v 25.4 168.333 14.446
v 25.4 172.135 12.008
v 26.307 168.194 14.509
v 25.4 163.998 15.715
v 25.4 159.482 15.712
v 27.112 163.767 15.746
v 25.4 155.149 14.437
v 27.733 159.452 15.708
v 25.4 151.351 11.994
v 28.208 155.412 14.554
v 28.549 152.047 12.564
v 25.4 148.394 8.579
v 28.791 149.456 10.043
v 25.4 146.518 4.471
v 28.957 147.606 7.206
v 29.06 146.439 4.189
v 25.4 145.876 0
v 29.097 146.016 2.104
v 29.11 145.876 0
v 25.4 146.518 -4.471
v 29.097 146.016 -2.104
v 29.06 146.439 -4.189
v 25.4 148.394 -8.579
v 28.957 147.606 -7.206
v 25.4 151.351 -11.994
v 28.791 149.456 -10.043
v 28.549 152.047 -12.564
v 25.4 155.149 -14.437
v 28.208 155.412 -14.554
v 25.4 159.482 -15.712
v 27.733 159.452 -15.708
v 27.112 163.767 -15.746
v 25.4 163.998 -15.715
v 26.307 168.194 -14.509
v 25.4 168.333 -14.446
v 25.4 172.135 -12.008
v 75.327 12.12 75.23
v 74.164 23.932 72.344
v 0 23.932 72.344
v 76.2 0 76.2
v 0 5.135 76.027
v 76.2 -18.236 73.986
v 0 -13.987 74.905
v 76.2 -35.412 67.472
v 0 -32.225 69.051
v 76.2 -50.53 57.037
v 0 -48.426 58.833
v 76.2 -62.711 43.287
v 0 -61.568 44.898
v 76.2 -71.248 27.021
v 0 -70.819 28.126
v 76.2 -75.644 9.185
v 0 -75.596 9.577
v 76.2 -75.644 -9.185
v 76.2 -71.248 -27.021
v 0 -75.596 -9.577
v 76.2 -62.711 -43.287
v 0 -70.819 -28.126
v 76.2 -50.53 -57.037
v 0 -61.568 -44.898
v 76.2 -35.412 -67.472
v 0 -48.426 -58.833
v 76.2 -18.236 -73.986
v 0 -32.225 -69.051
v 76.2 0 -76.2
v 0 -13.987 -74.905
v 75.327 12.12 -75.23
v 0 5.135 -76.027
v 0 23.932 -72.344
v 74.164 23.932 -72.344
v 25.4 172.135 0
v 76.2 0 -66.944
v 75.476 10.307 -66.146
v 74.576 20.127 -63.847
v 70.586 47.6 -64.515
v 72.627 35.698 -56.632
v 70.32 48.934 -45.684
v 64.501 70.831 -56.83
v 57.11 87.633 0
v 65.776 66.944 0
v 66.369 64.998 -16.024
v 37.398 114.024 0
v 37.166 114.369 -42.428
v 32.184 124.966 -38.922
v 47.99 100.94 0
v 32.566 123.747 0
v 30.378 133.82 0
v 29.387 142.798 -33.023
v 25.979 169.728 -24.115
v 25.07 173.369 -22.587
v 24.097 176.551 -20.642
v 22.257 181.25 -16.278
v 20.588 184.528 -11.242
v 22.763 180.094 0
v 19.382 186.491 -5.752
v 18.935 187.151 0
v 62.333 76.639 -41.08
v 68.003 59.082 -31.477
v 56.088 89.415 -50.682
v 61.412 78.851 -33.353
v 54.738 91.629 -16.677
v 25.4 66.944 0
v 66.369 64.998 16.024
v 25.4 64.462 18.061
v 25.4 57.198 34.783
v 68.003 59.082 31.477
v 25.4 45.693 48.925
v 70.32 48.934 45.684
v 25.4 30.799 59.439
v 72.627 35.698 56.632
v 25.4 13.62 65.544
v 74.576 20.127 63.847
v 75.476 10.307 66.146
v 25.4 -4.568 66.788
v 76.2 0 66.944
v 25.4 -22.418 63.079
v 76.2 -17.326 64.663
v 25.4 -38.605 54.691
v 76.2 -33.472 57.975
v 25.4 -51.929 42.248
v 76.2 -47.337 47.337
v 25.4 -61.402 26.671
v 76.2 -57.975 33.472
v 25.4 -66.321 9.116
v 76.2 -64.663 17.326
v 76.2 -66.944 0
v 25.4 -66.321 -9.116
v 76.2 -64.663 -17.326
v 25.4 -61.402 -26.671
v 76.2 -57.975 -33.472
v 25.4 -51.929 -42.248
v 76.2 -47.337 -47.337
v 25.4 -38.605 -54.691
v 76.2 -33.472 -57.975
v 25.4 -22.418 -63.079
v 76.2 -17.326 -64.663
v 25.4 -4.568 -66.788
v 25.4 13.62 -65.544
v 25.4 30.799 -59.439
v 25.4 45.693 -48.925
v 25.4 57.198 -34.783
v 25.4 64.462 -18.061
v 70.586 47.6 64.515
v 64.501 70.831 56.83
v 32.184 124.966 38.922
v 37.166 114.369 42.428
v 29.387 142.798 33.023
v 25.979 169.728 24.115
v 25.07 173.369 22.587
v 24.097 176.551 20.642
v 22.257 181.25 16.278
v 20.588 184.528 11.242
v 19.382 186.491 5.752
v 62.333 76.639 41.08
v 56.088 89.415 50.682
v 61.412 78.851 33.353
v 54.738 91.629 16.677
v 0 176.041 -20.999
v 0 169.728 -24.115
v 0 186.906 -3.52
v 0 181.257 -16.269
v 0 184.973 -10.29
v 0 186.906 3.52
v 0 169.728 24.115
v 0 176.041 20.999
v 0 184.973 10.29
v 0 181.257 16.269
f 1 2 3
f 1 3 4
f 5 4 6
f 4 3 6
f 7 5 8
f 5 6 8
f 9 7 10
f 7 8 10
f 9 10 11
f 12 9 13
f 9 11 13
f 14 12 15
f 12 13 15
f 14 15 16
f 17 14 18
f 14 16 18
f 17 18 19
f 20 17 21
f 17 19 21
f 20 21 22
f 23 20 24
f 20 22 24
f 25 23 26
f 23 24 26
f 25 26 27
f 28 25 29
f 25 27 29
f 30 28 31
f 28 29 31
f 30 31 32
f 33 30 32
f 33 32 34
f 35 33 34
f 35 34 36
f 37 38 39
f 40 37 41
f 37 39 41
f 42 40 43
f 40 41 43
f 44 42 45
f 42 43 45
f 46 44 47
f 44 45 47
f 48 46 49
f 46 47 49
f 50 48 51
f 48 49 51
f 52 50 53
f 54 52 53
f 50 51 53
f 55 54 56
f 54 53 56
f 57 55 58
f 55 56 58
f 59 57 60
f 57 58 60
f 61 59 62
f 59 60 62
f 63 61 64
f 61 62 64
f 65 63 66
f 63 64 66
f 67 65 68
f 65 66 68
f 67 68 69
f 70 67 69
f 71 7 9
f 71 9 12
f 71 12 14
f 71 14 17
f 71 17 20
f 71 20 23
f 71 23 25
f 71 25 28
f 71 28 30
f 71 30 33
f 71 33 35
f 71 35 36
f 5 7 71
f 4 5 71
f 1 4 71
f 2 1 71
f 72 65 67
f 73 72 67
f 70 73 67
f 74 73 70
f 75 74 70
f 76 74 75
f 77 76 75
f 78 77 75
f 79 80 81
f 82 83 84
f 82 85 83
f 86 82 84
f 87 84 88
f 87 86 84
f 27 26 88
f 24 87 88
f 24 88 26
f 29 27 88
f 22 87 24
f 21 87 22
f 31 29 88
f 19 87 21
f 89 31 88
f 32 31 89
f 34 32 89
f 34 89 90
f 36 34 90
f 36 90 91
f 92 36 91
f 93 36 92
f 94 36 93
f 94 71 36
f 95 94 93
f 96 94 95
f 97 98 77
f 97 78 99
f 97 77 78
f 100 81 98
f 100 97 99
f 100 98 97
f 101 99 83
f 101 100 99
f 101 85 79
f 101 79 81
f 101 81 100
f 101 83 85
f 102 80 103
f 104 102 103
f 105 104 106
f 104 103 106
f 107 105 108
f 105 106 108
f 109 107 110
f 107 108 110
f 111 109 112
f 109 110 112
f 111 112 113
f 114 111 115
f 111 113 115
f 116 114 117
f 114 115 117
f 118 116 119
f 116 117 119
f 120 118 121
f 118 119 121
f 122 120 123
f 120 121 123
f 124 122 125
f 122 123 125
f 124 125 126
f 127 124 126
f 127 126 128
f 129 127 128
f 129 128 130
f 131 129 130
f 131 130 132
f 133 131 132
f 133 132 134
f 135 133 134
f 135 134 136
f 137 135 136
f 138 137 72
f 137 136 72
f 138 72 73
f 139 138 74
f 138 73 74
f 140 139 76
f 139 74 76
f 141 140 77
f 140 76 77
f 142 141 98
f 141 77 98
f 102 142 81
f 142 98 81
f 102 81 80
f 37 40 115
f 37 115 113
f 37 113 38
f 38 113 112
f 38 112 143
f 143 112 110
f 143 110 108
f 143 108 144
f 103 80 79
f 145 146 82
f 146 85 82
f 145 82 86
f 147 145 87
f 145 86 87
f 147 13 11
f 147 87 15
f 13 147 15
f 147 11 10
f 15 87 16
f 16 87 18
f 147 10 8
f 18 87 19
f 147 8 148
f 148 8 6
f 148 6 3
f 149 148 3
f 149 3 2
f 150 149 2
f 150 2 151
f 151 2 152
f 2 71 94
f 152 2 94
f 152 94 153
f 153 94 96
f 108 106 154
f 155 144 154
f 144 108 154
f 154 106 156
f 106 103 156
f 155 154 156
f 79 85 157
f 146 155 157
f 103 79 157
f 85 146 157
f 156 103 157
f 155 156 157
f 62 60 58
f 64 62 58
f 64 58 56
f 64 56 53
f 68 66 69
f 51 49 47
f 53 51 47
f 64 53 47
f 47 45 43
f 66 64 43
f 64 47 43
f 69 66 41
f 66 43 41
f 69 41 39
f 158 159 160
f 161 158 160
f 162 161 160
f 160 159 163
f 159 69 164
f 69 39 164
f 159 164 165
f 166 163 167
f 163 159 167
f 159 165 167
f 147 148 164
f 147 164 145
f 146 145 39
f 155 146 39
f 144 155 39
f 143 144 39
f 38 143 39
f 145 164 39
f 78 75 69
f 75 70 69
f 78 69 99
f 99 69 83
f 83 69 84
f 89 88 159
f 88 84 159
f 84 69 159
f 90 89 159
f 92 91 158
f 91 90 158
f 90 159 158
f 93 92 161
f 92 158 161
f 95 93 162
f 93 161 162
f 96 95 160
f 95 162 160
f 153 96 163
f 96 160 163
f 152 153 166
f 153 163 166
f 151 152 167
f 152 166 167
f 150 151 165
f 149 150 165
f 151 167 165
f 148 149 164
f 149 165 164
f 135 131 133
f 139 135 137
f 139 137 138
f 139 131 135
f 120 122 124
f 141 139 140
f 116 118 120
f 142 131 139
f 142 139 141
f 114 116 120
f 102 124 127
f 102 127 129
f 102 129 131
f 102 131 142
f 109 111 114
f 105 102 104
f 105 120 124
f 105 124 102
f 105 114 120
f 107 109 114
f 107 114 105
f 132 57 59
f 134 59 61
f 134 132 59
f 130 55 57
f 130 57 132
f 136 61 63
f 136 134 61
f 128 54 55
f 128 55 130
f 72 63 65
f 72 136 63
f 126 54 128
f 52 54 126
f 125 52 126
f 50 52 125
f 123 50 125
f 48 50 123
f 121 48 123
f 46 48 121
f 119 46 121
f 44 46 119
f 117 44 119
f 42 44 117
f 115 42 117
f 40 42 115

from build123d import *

# Parameters (mm, degrees)
F1_DEPTH = 76.2
F2_R     = 66.9441745007
F2_R_2   = 15.875
F3_DEPTH = 50.8
F5_DEPTH = 137.16


# Not quite as in the source:
# - a feature names something its author has since deleted; it is built from what else it names


with BuildPart() as f1:
    # F0 (on Right) → F1 (new body)
    with BuildSketch(Plane.YZ):
        with BuildLine():
            Line((169.7282094477, 24.1148148653), (23.9315970236, 72.344444596))
            ThreePointArc((23.9315970236, 72.344444596), (-76.2, 0), (23.9315970236, -72.344444596))
            Line((23.9315970236, -72.344444596), (169.7282094477, -24.1148148653))
            ThreePointArc((169.7282094477, -24.1148148653), (187.1510104398, 0), (169.7282094477, 24.1148148653))
        make_face()
    extrude(amount=F1_DEPTH)

    # F2 (on face) → F3 (cut)
    with BuildSketch(Plane.YZ.offset(76.2)):
        Circle(F2_R)
        with Locations((161.7510104398, 0)):
            Circle(F2_R_2)
    extrude(amount=-F3_DEPTH, mode=Mode.SUBTRACT)

    # F4 (on Top) → F5 (cut, symmetric)
    with BuildSketch(Plane.XY):
        with BuildLine():
            add(Edge.make_bspline(
                [(76.2, 0), (69.7670128122, 106.6320095463), (15.5509841332, 89.3209706266), (33.872663393, 196.783595894), (-4.8366077244, 199.8663842678)],
                knots=[0, 0, 0, 0, 0.5611625531, 1, 1, 1, 1], degree=3))
            Line((76.2, 0), (76.2, 199.8663842678))
            Line((76.2, 199.8663842678), (-4.8366077244, 199.8663842678))
        make_face()
    extrude(amount=F5_DEPTH, both=True, mode=Mode.SUBTRACT)


solid = f1.part
